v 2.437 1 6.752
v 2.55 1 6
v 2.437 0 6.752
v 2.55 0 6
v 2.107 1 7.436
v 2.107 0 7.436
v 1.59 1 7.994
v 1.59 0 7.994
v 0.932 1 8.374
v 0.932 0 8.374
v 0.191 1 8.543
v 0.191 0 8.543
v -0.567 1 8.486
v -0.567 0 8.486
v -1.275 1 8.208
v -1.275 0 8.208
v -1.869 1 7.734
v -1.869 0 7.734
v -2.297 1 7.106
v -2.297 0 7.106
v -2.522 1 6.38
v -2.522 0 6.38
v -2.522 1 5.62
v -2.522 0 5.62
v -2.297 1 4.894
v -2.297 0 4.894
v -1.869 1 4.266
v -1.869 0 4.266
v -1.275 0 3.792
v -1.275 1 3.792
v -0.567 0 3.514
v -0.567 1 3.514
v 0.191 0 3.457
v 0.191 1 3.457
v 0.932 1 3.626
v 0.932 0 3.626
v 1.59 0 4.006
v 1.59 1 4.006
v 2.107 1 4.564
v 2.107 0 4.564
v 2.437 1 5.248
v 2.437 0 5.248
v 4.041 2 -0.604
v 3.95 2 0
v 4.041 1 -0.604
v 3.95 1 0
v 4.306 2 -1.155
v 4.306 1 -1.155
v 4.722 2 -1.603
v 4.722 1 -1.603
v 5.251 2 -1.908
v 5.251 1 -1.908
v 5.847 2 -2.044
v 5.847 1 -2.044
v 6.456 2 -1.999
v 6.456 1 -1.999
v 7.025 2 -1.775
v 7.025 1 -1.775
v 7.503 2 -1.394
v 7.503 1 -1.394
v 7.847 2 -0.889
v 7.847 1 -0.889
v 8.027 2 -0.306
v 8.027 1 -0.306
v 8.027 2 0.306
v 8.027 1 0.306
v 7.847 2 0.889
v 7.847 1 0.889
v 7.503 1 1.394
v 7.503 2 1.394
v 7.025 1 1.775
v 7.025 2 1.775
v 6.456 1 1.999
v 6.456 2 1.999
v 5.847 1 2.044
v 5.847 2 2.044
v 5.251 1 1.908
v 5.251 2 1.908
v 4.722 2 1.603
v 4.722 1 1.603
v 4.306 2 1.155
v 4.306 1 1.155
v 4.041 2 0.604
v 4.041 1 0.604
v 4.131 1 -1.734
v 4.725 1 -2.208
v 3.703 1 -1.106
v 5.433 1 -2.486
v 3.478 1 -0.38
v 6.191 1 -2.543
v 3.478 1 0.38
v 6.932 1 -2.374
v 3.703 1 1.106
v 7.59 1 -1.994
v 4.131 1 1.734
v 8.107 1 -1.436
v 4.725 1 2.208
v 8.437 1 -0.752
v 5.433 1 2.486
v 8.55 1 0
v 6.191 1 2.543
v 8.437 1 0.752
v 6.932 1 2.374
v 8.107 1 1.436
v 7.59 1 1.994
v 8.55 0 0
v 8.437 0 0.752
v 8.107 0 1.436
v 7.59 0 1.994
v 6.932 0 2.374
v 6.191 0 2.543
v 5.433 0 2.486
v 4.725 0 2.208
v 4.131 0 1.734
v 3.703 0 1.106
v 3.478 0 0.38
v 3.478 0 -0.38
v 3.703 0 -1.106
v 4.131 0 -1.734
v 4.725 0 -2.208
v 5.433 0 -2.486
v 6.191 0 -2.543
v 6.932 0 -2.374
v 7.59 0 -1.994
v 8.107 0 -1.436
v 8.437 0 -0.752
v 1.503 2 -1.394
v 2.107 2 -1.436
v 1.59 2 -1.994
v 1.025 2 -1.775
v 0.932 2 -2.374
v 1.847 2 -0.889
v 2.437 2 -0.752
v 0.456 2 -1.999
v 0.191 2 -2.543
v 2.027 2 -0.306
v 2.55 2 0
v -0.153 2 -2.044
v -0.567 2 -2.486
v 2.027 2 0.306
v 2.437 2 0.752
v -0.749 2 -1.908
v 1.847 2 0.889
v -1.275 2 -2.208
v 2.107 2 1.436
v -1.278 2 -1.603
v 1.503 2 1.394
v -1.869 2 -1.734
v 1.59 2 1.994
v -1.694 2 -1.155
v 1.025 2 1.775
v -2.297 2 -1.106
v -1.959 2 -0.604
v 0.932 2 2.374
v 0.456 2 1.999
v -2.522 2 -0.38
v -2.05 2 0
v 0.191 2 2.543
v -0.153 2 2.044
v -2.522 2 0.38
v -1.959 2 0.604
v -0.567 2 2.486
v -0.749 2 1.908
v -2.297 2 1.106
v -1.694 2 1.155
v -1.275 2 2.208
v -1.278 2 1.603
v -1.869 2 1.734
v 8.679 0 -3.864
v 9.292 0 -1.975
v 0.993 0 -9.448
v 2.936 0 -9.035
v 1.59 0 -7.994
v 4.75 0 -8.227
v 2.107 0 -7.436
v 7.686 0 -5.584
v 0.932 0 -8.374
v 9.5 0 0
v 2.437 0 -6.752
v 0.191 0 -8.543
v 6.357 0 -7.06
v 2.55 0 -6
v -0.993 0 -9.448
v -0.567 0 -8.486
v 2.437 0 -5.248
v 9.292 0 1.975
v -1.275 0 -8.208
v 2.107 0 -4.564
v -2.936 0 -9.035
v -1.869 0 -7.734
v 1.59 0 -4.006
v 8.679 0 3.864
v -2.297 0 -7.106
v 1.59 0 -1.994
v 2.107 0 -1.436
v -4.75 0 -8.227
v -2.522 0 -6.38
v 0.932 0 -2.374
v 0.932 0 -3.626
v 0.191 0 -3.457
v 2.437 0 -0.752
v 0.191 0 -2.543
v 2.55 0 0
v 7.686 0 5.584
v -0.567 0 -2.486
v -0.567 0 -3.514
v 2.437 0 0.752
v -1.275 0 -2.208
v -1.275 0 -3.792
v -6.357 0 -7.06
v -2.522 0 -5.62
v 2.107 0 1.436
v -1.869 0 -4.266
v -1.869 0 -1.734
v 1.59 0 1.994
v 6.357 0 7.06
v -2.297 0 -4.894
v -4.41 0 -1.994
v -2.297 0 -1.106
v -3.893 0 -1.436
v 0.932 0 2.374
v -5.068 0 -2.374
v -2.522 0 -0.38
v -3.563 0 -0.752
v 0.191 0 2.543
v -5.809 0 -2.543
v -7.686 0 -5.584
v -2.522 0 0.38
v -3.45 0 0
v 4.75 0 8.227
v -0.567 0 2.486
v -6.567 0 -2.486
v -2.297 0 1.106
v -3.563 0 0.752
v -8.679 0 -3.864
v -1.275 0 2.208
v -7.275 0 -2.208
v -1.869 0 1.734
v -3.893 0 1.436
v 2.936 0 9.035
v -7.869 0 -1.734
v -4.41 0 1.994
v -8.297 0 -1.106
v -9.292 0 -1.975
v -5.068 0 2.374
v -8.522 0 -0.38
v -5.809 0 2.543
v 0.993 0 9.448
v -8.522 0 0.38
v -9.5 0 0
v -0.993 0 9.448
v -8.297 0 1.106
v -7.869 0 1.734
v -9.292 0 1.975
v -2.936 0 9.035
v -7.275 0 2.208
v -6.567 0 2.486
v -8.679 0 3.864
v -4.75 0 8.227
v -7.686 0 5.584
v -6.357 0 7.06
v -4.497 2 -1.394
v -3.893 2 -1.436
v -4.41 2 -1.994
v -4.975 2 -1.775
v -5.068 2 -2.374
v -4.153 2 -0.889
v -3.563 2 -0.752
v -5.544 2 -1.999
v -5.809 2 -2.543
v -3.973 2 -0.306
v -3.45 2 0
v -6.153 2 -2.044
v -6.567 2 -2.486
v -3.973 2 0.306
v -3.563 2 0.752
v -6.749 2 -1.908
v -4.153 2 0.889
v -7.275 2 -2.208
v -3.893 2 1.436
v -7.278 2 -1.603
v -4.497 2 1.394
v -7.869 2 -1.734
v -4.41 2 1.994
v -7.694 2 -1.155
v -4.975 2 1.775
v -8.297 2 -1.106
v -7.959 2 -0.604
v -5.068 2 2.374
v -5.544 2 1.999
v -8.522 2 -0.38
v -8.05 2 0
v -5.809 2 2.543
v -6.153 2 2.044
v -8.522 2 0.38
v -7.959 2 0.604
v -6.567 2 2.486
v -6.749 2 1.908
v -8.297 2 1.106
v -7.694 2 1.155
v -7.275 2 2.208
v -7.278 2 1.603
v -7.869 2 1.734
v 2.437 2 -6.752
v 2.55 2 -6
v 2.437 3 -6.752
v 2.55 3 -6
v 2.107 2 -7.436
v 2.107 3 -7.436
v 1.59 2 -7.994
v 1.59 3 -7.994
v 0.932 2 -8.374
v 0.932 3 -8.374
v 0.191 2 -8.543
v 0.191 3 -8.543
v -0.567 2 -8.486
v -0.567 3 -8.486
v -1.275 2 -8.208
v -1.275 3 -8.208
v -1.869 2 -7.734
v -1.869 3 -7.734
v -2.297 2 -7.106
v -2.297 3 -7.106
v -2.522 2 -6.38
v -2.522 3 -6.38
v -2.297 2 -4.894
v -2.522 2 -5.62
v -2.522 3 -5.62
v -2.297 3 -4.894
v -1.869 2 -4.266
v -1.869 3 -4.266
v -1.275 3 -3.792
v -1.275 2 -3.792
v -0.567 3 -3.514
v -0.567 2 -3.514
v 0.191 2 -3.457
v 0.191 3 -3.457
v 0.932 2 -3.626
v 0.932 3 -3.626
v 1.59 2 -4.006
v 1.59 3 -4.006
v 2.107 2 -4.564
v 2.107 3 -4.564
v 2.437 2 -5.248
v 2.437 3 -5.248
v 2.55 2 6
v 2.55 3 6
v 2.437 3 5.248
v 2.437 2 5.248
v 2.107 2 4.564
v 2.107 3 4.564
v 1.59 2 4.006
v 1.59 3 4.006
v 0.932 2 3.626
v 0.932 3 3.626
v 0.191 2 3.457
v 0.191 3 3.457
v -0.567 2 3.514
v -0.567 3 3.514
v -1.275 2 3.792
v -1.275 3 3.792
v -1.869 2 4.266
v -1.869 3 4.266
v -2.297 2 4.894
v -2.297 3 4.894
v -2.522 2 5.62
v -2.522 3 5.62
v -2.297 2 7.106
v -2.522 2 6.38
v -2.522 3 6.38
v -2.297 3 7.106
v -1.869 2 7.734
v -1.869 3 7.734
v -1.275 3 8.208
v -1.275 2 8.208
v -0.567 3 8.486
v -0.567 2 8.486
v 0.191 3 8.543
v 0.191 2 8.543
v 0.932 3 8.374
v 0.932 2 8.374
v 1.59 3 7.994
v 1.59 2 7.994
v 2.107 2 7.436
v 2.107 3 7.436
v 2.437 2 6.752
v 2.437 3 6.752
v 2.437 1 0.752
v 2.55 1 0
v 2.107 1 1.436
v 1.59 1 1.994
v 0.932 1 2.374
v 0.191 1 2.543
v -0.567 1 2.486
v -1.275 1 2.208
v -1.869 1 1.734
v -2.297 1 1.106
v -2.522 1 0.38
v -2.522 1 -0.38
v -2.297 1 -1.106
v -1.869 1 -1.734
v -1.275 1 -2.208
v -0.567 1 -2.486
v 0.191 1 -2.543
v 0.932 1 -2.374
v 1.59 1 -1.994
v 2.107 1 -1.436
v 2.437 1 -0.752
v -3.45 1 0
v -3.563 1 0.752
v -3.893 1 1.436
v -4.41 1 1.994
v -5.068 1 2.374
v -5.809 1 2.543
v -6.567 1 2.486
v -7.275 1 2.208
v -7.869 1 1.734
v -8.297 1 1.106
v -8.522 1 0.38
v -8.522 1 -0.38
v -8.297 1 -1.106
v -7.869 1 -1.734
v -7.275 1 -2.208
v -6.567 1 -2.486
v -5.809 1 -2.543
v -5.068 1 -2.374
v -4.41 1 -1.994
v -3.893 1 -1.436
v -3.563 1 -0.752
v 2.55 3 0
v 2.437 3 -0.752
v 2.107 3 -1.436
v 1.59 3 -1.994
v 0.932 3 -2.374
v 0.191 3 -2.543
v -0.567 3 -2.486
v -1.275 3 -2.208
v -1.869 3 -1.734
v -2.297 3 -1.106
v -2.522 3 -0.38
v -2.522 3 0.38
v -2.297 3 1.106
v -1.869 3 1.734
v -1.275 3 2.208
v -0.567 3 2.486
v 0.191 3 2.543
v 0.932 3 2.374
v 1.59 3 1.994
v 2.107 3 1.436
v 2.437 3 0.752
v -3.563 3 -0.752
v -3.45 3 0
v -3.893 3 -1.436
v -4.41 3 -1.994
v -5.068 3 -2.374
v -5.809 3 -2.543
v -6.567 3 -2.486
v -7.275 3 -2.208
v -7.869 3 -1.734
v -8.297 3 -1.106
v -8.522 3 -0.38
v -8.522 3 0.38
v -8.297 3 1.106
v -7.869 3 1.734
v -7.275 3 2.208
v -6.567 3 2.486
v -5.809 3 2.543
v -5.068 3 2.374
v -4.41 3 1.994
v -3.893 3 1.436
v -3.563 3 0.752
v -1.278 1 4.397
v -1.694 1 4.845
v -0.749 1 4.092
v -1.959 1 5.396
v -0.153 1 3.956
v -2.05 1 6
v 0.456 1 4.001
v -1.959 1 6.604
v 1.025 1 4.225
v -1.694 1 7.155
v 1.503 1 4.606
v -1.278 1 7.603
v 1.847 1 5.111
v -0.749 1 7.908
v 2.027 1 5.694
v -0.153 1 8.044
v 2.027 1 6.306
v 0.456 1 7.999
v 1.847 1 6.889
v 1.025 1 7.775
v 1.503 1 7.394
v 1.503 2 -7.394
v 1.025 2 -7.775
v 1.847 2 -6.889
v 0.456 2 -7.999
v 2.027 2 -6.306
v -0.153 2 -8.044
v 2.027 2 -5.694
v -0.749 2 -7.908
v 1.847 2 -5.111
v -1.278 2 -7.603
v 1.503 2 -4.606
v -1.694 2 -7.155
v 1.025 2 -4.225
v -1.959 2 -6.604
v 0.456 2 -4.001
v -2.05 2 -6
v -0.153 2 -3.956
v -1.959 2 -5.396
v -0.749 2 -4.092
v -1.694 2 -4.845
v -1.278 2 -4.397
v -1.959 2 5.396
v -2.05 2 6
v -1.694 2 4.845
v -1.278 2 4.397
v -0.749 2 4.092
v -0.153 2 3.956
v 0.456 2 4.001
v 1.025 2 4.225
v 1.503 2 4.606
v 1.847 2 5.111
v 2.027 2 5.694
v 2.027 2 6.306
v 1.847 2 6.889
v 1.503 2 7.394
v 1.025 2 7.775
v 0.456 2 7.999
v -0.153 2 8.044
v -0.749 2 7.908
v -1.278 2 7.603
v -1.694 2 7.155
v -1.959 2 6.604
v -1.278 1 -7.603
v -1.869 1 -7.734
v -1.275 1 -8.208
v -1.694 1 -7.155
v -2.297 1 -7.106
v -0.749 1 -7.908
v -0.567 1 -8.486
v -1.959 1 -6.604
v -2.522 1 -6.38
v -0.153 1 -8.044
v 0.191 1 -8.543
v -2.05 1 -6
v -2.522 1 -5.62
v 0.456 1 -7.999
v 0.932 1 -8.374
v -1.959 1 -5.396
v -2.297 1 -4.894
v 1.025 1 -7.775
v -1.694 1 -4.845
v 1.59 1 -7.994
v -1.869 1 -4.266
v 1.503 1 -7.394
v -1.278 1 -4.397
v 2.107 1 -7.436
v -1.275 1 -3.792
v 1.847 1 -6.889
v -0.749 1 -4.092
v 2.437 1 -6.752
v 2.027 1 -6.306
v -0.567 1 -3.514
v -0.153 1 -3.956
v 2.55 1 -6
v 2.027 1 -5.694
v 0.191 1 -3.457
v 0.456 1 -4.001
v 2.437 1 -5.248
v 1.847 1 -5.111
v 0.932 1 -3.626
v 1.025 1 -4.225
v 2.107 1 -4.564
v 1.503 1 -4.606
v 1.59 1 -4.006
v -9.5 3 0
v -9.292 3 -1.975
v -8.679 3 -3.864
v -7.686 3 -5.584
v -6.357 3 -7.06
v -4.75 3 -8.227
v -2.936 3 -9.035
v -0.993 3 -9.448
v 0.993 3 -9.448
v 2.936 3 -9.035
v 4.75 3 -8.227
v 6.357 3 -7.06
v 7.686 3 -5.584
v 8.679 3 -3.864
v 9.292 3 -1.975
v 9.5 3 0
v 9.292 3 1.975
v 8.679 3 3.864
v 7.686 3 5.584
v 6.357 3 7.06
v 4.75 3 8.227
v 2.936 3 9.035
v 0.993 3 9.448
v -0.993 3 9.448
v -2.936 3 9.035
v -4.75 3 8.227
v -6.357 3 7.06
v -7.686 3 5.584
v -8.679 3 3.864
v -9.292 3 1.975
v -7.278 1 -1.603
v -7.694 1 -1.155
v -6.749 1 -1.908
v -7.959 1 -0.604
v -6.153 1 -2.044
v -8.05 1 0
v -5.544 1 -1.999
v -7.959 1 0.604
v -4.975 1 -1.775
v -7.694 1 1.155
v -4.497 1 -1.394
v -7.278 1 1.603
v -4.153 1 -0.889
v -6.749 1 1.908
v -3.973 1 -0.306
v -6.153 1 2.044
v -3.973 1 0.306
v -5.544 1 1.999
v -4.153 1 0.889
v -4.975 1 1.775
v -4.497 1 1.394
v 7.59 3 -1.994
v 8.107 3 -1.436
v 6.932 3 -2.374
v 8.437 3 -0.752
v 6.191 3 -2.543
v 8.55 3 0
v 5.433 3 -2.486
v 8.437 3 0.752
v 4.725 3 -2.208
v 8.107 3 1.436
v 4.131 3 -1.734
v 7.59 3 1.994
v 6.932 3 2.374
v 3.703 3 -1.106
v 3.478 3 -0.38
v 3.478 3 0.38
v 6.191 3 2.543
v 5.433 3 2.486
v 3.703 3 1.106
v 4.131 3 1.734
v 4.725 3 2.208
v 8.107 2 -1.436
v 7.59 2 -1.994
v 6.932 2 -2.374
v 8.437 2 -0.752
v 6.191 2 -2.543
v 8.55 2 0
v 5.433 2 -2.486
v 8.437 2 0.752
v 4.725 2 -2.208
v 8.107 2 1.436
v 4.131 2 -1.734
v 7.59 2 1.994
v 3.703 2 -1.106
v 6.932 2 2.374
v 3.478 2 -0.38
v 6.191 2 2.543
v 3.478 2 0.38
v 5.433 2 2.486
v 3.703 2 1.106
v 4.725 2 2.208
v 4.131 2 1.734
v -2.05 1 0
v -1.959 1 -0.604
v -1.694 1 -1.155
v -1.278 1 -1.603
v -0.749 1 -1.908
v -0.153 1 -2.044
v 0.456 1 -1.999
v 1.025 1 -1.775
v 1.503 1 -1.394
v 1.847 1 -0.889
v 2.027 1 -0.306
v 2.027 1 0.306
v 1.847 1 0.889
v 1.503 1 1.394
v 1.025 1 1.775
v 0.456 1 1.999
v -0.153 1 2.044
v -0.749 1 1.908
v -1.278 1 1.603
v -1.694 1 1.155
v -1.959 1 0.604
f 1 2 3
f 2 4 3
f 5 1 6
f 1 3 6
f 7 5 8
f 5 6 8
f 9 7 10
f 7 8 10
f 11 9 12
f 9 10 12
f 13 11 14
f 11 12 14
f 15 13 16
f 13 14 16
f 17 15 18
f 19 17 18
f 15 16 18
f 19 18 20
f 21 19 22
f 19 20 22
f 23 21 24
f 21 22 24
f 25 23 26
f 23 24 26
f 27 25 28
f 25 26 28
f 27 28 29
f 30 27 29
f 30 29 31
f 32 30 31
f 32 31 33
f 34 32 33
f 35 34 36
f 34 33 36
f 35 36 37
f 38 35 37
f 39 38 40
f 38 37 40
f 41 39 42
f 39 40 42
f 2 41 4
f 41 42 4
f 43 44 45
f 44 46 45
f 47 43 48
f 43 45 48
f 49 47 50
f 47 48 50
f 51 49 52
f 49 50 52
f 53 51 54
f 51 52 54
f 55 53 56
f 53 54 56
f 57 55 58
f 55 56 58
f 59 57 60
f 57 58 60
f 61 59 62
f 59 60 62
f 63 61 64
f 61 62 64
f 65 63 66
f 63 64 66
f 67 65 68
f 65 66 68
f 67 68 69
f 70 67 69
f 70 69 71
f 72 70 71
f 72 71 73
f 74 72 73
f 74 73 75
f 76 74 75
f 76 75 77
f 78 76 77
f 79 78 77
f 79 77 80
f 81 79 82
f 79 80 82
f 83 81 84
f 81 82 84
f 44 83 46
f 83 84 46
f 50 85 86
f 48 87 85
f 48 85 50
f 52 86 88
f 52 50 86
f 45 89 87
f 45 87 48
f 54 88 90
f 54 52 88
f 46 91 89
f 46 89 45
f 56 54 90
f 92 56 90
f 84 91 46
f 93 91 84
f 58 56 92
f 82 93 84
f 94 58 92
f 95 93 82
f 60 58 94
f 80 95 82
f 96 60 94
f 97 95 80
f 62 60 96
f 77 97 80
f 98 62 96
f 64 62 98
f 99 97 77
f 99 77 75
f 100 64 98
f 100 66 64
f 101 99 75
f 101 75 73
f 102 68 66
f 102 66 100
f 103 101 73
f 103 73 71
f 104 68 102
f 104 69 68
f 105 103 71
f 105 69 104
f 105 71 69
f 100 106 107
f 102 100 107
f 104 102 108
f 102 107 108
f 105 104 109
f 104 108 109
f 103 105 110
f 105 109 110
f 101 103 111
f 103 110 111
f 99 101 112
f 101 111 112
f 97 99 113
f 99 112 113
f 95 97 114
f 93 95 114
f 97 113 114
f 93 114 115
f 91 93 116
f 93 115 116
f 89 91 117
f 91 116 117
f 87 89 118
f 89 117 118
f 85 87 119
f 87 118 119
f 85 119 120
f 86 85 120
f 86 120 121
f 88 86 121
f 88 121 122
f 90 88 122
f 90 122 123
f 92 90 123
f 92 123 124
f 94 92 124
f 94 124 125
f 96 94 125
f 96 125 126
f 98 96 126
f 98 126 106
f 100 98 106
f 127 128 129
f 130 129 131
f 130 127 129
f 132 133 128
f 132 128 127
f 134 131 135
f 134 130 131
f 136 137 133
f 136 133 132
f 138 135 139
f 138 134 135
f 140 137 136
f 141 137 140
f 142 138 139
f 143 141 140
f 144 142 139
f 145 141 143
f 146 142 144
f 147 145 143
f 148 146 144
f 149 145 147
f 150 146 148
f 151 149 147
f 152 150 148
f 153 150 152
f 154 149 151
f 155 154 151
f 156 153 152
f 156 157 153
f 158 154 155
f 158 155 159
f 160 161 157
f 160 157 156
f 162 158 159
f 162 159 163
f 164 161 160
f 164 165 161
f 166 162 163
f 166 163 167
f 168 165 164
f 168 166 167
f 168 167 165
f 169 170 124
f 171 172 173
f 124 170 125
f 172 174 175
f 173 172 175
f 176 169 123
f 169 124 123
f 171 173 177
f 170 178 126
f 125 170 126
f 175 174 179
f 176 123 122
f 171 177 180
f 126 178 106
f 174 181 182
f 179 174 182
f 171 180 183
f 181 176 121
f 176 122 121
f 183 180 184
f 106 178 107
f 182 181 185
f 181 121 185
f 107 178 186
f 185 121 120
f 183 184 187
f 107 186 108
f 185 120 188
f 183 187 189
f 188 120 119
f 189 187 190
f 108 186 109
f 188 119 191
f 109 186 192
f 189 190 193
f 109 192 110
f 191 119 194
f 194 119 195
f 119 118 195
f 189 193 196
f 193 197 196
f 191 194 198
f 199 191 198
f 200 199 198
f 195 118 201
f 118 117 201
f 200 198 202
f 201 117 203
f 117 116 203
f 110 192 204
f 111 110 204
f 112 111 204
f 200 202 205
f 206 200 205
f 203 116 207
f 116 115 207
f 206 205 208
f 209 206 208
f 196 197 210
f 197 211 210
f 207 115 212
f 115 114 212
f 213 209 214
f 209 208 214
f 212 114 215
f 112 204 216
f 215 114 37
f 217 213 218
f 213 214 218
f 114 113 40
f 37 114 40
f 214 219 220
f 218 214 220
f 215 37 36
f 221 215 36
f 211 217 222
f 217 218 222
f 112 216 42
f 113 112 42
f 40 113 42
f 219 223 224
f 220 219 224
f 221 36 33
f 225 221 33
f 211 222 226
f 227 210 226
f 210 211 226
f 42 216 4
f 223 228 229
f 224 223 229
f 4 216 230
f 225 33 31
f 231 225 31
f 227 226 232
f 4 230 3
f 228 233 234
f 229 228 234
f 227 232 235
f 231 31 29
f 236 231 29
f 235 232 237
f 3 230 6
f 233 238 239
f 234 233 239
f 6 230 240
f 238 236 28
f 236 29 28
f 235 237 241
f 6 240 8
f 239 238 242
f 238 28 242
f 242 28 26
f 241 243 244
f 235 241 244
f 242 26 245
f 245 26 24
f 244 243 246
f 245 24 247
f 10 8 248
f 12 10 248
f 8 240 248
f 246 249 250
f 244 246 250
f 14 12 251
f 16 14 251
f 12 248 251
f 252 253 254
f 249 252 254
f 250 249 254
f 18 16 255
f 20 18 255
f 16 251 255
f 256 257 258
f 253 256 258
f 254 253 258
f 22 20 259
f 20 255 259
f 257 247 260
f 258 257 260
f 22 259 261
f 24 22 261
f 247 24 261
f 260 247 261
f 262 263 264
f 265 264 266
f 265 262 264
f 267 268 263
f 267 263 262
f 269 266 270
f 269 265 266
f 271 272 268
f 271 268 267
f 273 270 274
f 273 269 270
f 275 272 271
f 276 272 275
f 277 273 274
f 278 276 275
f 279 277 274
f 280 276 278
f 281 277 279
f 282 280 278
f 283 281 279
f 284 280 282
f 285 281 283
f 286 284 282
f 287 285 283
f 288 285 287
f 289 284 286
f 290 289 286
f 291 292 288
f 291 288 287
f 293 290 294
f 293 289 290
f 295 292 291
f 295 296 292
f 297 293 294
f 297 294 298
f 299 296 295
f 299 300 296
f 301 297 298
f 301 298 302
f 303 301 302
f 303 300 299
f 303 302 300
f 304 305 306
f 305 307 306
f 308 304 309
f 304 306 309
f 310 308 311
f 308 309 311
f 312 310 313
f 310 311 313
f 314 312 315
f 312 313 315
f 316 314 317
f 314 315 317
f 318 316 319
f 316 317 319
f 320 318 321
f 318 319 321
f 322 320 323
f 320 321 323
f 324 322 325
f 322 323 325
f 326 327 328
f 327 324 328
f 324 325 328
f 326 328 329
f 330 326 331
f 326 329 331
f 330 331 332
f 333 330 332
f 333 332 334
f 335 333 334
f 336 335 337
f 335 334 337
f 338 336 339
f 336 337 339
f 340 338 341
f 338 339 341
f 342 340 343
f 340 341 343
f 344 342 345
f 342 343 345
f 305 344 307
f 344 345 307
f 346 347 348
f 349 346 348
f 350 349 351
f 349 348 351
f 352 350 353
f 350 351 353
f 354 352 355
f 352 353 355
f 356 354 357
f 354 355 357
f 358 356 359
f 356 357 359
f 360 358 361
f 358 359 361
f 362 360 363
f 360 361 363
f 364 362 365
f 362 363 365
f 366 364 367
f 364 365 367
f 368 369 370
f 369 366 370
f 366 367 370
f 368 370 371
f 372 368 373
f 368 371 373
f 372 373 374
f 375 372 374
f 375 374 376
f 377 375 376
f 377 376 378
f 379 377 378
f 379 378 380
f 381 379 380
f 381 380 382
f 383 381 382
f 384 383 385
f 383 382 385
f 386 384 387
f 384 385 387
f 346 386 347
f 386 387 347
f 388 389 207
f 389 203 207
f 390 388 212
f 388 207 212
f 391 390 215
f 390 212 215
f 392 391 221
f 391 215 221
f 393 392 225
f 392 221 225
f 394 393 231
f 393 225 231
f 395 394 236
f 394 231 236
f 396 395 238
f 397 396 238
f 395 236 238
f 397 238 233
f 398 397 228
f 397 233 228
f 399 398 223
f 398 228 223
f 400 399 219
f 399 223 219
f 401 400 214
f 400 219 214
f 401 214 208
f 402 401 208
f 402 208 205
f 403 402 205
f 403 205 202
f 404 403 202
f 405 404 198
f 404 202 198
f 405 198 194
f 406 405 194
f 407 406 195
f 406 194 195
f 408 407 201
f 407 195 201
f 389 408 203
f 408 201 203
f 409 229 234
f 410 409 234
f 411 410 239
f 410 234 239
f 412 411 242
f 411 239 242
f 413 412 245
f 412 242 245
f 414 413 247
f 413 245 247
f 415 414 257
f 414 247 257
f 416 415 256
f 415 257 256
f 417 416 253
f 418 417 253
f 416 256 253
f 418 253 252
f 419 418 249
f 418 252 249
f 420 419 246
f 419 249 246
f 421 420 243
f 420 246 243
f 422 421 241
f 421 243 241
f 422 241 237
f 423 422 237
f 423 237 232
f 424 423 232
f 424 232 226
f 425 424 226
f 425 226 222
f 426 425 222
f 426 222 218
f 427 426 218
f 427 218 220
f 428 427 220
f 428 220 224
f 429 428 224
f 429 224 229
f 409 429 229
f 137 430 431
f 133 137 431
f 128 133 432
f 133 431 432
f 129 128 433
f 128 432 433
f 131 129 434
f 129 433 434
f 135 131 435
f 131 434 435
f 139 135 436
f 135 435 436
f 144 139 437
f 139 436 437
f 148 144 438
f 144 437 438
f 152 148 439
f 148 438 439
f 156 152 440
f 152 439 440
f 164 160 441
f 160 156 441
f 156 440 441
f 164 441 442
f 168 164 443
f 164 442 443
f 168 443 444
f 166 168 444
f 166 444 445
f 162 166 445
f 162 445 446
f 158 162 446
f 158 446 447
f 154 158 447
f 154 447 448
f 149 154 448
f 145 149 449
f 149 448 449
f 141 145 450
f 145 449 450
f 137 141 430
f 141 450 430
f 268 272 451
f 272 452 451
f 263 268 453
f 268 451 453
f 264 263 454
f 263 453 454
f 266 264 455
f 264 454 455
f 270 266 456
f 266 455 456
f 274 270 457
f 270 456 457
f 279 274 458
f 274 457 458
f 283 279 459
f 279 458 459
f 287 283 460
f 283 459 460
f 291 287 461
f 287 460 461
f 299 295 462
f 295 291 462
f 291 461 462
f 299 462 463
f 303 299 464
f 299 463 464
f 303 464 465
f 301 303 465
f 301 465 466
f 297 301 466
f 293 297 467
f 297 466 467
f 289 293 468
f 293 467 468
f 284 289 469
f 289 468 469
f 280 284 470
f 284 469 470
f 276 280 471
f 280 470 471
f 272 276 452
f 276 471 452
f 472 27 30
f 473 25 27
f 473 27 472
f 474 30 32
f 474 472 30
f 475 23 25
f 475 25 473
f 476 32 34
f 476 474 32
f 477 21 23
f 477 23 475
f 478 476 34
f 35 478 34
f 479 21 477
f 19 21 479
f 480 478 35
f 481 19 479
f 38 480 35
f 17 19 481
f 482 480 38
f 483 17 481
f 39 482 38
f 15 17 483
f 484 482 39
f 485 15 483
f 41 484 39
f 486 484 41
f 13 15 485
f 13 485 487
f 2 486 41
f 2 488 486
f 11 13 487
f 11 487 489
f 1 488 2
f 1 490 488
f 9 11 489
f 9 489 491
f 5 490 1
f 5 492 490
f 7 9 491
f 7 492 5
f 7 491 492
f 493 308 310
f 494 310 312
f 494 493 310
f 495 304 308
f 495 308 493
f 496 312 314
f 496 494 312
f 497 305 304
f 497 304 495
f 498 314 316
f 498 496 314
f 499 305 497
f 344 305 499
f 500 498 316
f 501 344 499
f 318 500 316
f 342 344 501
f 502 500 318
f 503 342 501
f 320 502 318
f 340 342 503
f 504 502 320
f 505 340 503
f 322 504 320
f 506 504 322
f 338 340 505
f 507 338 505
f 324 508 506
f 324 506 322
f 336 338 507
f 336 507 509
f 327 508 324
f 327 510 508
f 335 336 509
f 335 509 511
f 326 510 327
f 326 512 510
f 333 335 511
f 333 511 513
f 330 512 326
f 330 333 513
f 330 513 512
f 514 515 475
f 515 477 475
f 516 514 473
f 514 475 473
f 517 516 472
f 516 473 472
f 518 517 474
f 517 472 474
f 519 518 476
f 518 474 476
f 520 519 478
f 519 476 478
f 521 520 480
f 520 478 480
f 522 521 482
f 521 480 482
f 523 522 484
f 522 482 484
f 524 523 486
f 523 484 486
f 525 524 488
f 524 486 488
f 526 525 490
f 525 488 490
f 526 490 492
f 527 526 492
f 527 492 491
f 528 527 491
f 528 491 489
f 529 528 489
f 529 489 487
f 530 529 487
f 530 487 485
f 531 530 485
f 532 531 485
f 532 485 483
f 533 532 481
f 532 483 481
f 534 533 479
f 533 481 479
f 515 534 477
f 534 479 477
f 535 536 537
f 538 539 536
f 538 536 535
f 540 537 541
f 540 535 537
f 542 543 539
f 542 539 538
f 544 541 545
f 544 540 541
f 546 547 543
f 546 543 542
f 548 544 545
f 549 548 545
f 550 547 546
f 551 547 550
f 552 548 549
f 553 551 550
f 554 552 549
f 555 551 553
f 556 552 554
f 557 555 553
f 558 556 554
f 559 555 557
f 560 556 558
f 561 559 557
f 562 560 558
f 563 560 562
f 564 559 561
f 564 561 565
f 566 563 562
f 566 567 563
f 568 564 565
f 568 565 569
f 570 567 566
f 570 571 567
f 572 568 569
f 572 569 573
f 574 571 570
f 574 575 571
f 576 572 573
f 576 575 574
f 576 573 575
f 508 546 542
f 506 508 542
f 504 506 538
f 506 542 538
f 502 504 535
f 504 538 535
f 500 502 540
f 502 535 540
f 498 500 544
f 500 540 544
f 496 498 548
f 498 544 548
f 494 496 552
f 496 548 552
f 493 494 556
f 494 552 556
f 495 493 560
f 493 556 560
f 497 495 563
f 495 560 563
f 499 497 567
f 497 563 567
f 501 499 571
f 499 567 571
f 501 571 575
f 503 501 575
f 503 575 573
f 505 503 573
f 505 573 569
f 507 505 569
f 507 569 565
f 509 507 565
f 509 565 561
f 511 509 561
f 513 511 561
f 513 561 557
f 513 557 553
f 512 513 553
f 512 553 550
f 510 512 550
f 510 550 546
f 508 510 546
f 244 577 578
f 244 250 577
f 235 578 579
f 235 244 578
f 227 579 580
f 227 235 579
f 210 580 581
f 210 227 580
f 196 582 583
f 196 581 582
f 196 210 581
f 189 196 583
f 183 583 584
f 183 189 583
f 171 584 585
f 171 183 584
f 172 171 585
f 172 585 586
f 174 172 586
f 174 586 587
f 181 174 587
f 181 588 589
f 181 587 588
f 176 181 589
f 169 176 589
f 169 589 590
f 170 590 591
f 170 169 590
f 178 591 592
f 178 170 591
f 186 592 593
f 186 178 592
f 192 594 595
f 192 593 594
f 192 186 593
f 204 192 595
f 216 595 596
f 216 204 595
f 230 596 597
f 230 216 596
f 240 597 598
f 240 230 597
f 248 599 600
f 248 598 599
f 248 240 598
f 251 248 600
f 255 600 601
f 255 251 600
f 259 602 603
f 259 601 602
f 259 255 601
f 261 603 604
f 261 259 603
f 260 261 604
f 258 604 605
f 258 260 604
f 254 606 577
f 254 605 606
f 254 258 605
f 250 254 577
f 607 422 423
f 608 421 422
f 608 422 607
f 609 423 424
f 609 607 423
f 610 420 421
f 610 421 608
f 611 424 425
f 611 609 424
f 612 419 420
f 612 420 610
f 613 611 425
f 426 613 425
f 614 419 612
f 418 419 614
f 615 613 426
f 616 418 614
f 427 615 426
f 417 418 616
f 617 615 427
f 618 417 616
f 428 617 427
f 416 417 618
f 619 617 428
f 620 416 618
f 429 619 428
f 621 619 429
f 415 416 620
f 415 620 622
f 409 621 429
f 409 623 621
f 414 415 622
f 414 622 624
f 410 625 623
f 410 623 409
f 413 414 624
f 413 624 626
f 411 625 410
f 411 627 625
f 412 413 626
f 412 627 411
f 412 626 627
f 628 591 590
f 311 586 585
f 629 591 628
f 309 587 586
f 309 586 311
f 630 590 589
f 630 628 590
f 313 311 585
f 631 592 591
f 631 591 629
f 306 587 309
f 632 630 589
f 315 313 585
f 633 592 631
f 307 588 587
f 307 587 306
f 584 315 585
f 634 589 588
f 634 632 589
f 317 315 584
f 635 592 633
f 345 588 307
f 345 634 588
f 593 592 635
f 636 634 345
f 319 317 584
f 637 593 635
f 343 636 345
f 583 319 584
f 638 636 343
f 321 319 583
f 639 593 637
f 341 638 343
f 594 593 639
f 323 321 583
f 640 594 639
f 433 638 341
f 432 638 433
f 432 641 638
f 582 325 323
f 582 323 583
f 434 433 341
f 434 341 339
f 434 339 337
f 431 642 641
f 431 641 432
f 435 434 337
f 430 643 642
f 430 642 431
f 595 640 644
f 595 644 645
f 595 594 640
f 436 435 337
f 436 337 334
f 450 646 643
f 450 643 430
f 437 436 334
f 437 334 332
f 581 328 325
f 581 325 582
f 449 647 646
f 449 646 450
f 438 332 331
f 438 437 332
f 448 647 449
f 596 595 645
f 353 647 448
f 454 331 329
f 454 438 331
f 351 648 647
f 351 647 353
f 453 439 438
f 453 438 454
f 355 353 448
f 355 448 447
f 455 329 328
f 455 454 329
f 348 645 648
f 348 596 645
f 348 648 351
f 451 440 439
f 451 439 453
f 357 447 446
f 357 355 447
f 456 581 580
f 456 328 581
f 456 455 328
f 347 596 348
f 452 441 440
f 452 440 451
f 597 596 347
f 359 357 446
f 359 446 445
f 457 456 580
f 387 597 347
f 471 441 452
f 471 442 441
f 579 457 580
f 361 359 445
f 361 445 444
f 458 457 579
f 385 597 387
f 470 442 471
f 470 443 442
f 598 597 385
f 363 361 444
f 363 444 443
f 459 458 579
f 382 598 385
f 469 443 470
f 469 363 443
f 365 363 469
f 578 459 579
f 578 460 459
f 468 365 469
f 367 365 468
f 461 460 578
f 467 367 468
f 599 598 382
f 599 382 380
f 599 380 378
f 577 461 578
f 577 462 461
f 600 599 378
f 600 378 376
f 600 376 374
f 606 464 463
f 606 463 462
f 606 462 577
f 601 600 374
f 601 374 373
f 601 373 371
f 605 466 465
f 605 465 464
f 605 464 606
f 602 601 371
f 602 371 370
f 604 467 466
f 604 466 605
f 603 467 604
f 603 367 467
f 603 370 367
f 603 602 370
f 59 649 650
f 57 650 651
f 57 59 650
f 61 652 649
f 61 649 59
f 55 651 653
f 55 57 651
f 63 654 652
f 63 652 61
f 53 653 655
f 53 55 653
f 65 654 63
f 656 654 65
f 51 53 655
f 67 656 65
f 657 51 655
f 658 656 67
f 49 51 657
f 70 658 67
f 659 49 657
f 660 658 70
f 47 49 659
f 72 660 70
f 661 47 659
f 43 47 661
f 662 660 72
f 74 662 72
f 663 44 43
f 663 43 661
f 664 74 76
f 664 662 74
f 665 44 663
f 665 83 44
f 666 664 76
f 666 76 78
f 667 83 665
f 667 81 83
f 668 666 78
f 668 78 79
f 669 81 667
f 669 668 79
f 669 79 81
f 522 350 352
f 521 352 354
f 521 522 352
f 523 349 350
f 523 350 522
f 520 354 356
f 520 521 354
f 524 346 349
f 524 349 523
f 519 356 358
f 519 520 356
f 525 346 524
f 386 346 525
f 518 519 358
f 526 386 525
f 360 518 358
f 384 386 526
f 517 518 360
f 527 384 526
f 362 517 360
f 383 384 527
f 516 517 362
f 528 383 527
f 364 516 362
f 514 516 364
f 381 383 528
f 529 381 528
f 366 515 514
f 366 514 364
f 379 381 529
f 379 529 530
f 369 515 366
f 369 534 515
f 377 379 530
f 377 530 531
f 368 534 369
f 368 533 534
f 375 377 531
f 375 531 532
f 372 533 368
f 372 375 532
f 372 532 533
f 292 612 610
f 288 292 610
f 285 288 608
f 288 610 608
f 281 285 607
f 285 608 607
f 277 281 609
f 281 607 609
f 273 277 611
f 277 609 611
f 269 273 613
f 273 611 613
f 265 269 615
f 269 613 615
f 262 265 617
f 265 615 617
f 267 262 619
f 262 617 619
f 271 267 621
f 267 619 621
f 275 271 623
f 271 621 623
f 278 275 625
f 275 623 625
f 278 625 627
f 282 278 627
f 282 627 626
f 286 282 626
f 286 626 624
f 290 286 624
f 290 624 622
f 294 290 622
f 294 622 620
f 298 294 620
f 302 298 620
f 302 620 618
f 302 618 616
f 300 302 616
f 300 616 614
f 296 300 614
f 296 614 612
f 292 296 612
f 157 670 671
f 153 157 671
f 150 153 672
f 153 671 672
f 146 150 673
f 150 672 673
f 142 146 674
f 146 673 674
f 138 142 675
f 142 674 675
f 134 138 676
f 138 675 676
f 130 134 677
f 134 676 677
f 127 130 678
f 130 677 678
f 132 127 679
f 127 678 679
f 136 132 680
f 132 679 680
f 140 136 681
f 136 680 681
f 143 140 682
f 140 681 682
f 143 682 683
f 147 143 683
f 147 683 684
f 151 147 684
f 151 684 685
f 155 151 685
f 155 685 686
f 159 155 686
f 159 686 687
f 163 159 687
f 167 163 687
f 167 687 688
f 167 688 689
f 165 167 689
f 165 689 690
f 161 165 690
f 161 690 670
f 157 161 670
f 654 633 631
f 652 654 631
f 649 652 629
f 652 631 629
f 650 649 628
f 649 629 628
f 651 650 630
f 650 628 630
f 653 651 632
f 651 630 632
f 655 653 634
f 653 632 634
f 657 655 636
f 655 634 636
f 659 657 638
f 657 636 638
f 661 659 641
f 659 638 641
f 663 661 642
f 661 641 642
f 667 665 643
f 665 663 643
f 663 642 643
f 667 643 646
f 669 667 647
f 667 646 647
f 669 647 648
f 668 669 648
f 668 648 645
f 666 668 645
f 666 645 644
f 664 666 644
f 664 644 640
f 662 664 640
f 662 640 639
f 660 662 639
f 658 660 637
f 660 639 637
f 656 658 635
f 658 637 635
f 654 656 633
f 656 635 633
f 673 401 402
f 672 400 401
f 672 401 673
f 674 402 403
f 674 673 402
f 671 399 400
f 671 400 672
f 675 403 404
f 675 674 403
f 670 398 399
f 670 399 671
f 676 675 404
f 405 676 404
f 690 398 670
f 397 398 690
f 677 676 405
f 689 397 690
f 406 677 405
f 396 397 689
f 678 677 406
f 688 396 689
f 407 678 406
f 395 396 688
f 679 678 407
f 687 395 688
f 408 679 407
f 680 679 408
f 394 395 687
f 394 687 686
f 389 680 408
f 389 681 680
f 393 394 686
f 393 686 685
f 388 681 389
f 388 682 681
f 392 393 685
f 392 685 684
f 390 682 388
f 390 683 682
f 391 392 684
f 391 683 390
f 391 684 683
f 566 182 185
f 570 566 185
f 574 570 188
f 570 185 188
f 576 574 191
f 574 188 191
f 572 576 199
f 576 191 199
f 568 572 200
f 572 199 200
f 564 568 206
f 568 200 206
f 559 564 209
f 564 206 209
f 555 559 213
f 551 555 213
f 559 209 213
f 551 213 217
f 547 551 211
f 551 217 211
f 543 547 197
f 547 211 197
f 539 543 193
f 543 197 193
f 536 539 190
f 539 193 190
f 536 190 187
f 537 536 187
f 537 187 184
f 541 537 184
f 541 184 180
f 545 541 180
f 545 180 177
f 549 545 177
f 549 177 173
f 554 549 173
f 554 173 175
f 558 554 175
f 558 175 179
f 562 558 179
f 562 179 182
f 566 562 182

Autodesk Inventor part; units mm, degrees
ref_plane "YZ Plane" through (0, 0, 0) normal (1, 0, 0) x (0, 1, 0)
ref_plane "XZ Plane" through (0, 0, 0) normal (0, 1, 0) x (-1, 0, 0)
sketch "Esquisse1" plane through (0, 0, 0) normal (0, 1, 0) x (-1, 0, 0)
  circle A0 centre (0, 0) radius 9.5
  circle A1 centre (0, 0) radius 2.05
  line L0 (0, 9.5) -> (0, -9.5) construction
  line L1 (-9.5, 0) -> (9.5, 0) construction
  circle A2 centre (0, -6) radius 2.05
  circle A3 centre (0, 6) radius 2.05
  circle A4 centre (0, 0) radius 2.05
  circle A5 centre (6, 0) radius 2.05
  circle A6 centre (-6, 0) radius 2.05
  circle A7 centre (0, 0) radius 2.05
  dimension "d0" = 19
  dimension "d1" = 4.1
  dimension "d4" = 6
  dimension "d7" = 6
  dimension "d12" = 6
  dimension "d15" = 6
extrude "Extrusion1" add sketch "Esquisse1" along normal blind 3
sketch "Sketch2" plane through (0, 0, 0) normal (0, -1, 0) x (1, 0, 0)
  circle A0 centre (-6, 0) radius 2.05 projected
  circle A1 centre (-6, 0) radius 2.55
  circle A2 centre (0, 6) radius 2.05 projected
  circle A3 centre (0, 6) radius 2.55
  circle A4 centre (0, 0) radius 2.55
  circle A5 centre (6, 0) radius 2.05 projected
  circle A6 centre (6, 0) radius 2.55
  circle A7 centre (0, -6) radius 2.05 projected
  circle A8 centre (0, -6) radius 2.55
  dimension "d20" = 5.1
  dimension "d21" = 5.1
  dimension "d22" = 5.1
  dimension "d23" = 5.1
  dimension "d24" = 5.1
extrude "Extrusion2" cut sketch "Sketch2" against normal blind 1
ref_plane "Work Plane1" through (0, 1.5, 0) normal (0, -1, 0) x (1, 0, 0)
mirror "Mirror1" about plane through (0, 1.5, 0) normal (0, -1, 0) of "Extrusion2"
properties part number "XL320_IdlerToOllo"
